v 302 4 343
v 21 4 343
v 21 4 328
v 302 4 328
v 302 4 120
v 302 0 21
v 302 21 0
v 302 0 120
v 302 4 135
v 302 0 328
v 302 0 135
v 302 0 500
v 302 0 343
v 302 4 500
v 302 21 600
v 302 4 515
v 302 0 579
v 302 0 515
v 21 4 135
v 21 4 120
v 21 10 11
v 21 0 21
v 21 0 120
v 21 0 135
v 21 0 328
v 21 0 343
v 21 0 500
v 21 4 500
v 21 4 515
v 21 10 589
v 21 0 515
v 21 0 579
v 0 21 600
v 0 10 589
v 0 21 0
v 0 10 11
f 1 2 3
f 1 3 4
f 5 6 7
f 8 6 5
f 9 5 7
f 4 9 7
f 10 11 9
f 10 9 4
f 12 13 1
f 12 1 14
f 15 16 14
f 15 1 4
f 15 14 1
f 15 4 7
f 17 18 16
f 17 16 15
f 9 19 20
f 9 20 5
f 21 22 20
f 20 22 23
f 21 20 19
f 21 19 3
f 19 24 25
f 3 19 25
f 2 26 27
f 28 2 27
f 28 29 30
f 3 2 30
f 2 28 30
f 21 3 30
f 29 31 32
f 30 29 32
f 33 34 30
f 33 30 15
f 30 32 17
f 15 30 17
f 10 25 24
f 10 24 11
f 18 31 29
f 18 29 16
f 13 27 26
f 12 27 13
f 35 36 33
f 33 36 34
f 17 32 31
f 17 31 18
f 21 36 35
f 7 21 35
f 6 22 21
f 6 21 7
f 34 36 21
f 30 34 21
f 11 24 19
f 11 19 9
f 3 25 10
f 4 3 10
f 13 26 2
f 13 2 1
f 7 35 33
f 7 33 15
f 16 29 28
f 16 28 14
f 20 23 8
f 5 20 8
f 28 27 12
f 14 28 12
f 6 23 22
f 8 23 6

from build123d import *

# Parameters (mm, degrees)
F0_W     = 302
F0_H     = 600
F1_DEPTH = 21
F2_SIZE  = 20.99999
F3_W     = 21
F3_H     = 600
F4_DEPTH = 10
F5_W     = 302
F5_H     = 15
F6_DEPTH = 4
F7_W     = 281
F7_H     = 15
F8_DEPTH = 4


# Not quite as in the source:
# - a fillet or chamfer is up to 0.001 mm smaller than in the source, because OpenCascade refuses the exact size


with BuildPart() as f1:
    # F0 (on Front) → F1 (new body)
    with BuildSketch(Plane.XZ):
        with Locations((151, 300)):
            Rectangle(F0_W, F0_H)
    extrude(amount=-F1_DEPTH)

    # F2 (size 21 in the source; OpenCascade refuses exactly that, so slightly less here)
    f2_edges = [f1.edges().sort_by_distance(p)[0] for p in [
        (151, 0, 0),
        (151, 0, 600),
    ]]
    chamfer(f2_edges, length=F2_SIZE)

    # F3 (on face) → F4 (cut)
    with BuildSketch(Plane.XZ):
        with Locations((10.5, 300)):
            Rectangle(F3_W, F3_H)
    extrude(amount=-F4_DEPTH, mode=Mode.SUBTRACT)

    # F5 (on face) → F6 (cut)
    with BuildSketch(Plane.XZ):
        with Locations((151, 507.5)):
            Rectangle(F5_W, F5_H)
    extrude(amount=-F6_DEPTH, mode=Mode.SUBTRACT)

    # F7 (on face) → F8 (cut)
    with BuildSketch(Plane.XZ):
        with Locations((161.5, 335.5)):
            Rectangle(F7_W, F7_H)
        with Locations((161.5, 127.5)):
            Rectangle(F7_W, F7_H)
    extrude(amount=-F8_DEPTH, mode=Mode.SUBTRACT)


solid = f1.part
